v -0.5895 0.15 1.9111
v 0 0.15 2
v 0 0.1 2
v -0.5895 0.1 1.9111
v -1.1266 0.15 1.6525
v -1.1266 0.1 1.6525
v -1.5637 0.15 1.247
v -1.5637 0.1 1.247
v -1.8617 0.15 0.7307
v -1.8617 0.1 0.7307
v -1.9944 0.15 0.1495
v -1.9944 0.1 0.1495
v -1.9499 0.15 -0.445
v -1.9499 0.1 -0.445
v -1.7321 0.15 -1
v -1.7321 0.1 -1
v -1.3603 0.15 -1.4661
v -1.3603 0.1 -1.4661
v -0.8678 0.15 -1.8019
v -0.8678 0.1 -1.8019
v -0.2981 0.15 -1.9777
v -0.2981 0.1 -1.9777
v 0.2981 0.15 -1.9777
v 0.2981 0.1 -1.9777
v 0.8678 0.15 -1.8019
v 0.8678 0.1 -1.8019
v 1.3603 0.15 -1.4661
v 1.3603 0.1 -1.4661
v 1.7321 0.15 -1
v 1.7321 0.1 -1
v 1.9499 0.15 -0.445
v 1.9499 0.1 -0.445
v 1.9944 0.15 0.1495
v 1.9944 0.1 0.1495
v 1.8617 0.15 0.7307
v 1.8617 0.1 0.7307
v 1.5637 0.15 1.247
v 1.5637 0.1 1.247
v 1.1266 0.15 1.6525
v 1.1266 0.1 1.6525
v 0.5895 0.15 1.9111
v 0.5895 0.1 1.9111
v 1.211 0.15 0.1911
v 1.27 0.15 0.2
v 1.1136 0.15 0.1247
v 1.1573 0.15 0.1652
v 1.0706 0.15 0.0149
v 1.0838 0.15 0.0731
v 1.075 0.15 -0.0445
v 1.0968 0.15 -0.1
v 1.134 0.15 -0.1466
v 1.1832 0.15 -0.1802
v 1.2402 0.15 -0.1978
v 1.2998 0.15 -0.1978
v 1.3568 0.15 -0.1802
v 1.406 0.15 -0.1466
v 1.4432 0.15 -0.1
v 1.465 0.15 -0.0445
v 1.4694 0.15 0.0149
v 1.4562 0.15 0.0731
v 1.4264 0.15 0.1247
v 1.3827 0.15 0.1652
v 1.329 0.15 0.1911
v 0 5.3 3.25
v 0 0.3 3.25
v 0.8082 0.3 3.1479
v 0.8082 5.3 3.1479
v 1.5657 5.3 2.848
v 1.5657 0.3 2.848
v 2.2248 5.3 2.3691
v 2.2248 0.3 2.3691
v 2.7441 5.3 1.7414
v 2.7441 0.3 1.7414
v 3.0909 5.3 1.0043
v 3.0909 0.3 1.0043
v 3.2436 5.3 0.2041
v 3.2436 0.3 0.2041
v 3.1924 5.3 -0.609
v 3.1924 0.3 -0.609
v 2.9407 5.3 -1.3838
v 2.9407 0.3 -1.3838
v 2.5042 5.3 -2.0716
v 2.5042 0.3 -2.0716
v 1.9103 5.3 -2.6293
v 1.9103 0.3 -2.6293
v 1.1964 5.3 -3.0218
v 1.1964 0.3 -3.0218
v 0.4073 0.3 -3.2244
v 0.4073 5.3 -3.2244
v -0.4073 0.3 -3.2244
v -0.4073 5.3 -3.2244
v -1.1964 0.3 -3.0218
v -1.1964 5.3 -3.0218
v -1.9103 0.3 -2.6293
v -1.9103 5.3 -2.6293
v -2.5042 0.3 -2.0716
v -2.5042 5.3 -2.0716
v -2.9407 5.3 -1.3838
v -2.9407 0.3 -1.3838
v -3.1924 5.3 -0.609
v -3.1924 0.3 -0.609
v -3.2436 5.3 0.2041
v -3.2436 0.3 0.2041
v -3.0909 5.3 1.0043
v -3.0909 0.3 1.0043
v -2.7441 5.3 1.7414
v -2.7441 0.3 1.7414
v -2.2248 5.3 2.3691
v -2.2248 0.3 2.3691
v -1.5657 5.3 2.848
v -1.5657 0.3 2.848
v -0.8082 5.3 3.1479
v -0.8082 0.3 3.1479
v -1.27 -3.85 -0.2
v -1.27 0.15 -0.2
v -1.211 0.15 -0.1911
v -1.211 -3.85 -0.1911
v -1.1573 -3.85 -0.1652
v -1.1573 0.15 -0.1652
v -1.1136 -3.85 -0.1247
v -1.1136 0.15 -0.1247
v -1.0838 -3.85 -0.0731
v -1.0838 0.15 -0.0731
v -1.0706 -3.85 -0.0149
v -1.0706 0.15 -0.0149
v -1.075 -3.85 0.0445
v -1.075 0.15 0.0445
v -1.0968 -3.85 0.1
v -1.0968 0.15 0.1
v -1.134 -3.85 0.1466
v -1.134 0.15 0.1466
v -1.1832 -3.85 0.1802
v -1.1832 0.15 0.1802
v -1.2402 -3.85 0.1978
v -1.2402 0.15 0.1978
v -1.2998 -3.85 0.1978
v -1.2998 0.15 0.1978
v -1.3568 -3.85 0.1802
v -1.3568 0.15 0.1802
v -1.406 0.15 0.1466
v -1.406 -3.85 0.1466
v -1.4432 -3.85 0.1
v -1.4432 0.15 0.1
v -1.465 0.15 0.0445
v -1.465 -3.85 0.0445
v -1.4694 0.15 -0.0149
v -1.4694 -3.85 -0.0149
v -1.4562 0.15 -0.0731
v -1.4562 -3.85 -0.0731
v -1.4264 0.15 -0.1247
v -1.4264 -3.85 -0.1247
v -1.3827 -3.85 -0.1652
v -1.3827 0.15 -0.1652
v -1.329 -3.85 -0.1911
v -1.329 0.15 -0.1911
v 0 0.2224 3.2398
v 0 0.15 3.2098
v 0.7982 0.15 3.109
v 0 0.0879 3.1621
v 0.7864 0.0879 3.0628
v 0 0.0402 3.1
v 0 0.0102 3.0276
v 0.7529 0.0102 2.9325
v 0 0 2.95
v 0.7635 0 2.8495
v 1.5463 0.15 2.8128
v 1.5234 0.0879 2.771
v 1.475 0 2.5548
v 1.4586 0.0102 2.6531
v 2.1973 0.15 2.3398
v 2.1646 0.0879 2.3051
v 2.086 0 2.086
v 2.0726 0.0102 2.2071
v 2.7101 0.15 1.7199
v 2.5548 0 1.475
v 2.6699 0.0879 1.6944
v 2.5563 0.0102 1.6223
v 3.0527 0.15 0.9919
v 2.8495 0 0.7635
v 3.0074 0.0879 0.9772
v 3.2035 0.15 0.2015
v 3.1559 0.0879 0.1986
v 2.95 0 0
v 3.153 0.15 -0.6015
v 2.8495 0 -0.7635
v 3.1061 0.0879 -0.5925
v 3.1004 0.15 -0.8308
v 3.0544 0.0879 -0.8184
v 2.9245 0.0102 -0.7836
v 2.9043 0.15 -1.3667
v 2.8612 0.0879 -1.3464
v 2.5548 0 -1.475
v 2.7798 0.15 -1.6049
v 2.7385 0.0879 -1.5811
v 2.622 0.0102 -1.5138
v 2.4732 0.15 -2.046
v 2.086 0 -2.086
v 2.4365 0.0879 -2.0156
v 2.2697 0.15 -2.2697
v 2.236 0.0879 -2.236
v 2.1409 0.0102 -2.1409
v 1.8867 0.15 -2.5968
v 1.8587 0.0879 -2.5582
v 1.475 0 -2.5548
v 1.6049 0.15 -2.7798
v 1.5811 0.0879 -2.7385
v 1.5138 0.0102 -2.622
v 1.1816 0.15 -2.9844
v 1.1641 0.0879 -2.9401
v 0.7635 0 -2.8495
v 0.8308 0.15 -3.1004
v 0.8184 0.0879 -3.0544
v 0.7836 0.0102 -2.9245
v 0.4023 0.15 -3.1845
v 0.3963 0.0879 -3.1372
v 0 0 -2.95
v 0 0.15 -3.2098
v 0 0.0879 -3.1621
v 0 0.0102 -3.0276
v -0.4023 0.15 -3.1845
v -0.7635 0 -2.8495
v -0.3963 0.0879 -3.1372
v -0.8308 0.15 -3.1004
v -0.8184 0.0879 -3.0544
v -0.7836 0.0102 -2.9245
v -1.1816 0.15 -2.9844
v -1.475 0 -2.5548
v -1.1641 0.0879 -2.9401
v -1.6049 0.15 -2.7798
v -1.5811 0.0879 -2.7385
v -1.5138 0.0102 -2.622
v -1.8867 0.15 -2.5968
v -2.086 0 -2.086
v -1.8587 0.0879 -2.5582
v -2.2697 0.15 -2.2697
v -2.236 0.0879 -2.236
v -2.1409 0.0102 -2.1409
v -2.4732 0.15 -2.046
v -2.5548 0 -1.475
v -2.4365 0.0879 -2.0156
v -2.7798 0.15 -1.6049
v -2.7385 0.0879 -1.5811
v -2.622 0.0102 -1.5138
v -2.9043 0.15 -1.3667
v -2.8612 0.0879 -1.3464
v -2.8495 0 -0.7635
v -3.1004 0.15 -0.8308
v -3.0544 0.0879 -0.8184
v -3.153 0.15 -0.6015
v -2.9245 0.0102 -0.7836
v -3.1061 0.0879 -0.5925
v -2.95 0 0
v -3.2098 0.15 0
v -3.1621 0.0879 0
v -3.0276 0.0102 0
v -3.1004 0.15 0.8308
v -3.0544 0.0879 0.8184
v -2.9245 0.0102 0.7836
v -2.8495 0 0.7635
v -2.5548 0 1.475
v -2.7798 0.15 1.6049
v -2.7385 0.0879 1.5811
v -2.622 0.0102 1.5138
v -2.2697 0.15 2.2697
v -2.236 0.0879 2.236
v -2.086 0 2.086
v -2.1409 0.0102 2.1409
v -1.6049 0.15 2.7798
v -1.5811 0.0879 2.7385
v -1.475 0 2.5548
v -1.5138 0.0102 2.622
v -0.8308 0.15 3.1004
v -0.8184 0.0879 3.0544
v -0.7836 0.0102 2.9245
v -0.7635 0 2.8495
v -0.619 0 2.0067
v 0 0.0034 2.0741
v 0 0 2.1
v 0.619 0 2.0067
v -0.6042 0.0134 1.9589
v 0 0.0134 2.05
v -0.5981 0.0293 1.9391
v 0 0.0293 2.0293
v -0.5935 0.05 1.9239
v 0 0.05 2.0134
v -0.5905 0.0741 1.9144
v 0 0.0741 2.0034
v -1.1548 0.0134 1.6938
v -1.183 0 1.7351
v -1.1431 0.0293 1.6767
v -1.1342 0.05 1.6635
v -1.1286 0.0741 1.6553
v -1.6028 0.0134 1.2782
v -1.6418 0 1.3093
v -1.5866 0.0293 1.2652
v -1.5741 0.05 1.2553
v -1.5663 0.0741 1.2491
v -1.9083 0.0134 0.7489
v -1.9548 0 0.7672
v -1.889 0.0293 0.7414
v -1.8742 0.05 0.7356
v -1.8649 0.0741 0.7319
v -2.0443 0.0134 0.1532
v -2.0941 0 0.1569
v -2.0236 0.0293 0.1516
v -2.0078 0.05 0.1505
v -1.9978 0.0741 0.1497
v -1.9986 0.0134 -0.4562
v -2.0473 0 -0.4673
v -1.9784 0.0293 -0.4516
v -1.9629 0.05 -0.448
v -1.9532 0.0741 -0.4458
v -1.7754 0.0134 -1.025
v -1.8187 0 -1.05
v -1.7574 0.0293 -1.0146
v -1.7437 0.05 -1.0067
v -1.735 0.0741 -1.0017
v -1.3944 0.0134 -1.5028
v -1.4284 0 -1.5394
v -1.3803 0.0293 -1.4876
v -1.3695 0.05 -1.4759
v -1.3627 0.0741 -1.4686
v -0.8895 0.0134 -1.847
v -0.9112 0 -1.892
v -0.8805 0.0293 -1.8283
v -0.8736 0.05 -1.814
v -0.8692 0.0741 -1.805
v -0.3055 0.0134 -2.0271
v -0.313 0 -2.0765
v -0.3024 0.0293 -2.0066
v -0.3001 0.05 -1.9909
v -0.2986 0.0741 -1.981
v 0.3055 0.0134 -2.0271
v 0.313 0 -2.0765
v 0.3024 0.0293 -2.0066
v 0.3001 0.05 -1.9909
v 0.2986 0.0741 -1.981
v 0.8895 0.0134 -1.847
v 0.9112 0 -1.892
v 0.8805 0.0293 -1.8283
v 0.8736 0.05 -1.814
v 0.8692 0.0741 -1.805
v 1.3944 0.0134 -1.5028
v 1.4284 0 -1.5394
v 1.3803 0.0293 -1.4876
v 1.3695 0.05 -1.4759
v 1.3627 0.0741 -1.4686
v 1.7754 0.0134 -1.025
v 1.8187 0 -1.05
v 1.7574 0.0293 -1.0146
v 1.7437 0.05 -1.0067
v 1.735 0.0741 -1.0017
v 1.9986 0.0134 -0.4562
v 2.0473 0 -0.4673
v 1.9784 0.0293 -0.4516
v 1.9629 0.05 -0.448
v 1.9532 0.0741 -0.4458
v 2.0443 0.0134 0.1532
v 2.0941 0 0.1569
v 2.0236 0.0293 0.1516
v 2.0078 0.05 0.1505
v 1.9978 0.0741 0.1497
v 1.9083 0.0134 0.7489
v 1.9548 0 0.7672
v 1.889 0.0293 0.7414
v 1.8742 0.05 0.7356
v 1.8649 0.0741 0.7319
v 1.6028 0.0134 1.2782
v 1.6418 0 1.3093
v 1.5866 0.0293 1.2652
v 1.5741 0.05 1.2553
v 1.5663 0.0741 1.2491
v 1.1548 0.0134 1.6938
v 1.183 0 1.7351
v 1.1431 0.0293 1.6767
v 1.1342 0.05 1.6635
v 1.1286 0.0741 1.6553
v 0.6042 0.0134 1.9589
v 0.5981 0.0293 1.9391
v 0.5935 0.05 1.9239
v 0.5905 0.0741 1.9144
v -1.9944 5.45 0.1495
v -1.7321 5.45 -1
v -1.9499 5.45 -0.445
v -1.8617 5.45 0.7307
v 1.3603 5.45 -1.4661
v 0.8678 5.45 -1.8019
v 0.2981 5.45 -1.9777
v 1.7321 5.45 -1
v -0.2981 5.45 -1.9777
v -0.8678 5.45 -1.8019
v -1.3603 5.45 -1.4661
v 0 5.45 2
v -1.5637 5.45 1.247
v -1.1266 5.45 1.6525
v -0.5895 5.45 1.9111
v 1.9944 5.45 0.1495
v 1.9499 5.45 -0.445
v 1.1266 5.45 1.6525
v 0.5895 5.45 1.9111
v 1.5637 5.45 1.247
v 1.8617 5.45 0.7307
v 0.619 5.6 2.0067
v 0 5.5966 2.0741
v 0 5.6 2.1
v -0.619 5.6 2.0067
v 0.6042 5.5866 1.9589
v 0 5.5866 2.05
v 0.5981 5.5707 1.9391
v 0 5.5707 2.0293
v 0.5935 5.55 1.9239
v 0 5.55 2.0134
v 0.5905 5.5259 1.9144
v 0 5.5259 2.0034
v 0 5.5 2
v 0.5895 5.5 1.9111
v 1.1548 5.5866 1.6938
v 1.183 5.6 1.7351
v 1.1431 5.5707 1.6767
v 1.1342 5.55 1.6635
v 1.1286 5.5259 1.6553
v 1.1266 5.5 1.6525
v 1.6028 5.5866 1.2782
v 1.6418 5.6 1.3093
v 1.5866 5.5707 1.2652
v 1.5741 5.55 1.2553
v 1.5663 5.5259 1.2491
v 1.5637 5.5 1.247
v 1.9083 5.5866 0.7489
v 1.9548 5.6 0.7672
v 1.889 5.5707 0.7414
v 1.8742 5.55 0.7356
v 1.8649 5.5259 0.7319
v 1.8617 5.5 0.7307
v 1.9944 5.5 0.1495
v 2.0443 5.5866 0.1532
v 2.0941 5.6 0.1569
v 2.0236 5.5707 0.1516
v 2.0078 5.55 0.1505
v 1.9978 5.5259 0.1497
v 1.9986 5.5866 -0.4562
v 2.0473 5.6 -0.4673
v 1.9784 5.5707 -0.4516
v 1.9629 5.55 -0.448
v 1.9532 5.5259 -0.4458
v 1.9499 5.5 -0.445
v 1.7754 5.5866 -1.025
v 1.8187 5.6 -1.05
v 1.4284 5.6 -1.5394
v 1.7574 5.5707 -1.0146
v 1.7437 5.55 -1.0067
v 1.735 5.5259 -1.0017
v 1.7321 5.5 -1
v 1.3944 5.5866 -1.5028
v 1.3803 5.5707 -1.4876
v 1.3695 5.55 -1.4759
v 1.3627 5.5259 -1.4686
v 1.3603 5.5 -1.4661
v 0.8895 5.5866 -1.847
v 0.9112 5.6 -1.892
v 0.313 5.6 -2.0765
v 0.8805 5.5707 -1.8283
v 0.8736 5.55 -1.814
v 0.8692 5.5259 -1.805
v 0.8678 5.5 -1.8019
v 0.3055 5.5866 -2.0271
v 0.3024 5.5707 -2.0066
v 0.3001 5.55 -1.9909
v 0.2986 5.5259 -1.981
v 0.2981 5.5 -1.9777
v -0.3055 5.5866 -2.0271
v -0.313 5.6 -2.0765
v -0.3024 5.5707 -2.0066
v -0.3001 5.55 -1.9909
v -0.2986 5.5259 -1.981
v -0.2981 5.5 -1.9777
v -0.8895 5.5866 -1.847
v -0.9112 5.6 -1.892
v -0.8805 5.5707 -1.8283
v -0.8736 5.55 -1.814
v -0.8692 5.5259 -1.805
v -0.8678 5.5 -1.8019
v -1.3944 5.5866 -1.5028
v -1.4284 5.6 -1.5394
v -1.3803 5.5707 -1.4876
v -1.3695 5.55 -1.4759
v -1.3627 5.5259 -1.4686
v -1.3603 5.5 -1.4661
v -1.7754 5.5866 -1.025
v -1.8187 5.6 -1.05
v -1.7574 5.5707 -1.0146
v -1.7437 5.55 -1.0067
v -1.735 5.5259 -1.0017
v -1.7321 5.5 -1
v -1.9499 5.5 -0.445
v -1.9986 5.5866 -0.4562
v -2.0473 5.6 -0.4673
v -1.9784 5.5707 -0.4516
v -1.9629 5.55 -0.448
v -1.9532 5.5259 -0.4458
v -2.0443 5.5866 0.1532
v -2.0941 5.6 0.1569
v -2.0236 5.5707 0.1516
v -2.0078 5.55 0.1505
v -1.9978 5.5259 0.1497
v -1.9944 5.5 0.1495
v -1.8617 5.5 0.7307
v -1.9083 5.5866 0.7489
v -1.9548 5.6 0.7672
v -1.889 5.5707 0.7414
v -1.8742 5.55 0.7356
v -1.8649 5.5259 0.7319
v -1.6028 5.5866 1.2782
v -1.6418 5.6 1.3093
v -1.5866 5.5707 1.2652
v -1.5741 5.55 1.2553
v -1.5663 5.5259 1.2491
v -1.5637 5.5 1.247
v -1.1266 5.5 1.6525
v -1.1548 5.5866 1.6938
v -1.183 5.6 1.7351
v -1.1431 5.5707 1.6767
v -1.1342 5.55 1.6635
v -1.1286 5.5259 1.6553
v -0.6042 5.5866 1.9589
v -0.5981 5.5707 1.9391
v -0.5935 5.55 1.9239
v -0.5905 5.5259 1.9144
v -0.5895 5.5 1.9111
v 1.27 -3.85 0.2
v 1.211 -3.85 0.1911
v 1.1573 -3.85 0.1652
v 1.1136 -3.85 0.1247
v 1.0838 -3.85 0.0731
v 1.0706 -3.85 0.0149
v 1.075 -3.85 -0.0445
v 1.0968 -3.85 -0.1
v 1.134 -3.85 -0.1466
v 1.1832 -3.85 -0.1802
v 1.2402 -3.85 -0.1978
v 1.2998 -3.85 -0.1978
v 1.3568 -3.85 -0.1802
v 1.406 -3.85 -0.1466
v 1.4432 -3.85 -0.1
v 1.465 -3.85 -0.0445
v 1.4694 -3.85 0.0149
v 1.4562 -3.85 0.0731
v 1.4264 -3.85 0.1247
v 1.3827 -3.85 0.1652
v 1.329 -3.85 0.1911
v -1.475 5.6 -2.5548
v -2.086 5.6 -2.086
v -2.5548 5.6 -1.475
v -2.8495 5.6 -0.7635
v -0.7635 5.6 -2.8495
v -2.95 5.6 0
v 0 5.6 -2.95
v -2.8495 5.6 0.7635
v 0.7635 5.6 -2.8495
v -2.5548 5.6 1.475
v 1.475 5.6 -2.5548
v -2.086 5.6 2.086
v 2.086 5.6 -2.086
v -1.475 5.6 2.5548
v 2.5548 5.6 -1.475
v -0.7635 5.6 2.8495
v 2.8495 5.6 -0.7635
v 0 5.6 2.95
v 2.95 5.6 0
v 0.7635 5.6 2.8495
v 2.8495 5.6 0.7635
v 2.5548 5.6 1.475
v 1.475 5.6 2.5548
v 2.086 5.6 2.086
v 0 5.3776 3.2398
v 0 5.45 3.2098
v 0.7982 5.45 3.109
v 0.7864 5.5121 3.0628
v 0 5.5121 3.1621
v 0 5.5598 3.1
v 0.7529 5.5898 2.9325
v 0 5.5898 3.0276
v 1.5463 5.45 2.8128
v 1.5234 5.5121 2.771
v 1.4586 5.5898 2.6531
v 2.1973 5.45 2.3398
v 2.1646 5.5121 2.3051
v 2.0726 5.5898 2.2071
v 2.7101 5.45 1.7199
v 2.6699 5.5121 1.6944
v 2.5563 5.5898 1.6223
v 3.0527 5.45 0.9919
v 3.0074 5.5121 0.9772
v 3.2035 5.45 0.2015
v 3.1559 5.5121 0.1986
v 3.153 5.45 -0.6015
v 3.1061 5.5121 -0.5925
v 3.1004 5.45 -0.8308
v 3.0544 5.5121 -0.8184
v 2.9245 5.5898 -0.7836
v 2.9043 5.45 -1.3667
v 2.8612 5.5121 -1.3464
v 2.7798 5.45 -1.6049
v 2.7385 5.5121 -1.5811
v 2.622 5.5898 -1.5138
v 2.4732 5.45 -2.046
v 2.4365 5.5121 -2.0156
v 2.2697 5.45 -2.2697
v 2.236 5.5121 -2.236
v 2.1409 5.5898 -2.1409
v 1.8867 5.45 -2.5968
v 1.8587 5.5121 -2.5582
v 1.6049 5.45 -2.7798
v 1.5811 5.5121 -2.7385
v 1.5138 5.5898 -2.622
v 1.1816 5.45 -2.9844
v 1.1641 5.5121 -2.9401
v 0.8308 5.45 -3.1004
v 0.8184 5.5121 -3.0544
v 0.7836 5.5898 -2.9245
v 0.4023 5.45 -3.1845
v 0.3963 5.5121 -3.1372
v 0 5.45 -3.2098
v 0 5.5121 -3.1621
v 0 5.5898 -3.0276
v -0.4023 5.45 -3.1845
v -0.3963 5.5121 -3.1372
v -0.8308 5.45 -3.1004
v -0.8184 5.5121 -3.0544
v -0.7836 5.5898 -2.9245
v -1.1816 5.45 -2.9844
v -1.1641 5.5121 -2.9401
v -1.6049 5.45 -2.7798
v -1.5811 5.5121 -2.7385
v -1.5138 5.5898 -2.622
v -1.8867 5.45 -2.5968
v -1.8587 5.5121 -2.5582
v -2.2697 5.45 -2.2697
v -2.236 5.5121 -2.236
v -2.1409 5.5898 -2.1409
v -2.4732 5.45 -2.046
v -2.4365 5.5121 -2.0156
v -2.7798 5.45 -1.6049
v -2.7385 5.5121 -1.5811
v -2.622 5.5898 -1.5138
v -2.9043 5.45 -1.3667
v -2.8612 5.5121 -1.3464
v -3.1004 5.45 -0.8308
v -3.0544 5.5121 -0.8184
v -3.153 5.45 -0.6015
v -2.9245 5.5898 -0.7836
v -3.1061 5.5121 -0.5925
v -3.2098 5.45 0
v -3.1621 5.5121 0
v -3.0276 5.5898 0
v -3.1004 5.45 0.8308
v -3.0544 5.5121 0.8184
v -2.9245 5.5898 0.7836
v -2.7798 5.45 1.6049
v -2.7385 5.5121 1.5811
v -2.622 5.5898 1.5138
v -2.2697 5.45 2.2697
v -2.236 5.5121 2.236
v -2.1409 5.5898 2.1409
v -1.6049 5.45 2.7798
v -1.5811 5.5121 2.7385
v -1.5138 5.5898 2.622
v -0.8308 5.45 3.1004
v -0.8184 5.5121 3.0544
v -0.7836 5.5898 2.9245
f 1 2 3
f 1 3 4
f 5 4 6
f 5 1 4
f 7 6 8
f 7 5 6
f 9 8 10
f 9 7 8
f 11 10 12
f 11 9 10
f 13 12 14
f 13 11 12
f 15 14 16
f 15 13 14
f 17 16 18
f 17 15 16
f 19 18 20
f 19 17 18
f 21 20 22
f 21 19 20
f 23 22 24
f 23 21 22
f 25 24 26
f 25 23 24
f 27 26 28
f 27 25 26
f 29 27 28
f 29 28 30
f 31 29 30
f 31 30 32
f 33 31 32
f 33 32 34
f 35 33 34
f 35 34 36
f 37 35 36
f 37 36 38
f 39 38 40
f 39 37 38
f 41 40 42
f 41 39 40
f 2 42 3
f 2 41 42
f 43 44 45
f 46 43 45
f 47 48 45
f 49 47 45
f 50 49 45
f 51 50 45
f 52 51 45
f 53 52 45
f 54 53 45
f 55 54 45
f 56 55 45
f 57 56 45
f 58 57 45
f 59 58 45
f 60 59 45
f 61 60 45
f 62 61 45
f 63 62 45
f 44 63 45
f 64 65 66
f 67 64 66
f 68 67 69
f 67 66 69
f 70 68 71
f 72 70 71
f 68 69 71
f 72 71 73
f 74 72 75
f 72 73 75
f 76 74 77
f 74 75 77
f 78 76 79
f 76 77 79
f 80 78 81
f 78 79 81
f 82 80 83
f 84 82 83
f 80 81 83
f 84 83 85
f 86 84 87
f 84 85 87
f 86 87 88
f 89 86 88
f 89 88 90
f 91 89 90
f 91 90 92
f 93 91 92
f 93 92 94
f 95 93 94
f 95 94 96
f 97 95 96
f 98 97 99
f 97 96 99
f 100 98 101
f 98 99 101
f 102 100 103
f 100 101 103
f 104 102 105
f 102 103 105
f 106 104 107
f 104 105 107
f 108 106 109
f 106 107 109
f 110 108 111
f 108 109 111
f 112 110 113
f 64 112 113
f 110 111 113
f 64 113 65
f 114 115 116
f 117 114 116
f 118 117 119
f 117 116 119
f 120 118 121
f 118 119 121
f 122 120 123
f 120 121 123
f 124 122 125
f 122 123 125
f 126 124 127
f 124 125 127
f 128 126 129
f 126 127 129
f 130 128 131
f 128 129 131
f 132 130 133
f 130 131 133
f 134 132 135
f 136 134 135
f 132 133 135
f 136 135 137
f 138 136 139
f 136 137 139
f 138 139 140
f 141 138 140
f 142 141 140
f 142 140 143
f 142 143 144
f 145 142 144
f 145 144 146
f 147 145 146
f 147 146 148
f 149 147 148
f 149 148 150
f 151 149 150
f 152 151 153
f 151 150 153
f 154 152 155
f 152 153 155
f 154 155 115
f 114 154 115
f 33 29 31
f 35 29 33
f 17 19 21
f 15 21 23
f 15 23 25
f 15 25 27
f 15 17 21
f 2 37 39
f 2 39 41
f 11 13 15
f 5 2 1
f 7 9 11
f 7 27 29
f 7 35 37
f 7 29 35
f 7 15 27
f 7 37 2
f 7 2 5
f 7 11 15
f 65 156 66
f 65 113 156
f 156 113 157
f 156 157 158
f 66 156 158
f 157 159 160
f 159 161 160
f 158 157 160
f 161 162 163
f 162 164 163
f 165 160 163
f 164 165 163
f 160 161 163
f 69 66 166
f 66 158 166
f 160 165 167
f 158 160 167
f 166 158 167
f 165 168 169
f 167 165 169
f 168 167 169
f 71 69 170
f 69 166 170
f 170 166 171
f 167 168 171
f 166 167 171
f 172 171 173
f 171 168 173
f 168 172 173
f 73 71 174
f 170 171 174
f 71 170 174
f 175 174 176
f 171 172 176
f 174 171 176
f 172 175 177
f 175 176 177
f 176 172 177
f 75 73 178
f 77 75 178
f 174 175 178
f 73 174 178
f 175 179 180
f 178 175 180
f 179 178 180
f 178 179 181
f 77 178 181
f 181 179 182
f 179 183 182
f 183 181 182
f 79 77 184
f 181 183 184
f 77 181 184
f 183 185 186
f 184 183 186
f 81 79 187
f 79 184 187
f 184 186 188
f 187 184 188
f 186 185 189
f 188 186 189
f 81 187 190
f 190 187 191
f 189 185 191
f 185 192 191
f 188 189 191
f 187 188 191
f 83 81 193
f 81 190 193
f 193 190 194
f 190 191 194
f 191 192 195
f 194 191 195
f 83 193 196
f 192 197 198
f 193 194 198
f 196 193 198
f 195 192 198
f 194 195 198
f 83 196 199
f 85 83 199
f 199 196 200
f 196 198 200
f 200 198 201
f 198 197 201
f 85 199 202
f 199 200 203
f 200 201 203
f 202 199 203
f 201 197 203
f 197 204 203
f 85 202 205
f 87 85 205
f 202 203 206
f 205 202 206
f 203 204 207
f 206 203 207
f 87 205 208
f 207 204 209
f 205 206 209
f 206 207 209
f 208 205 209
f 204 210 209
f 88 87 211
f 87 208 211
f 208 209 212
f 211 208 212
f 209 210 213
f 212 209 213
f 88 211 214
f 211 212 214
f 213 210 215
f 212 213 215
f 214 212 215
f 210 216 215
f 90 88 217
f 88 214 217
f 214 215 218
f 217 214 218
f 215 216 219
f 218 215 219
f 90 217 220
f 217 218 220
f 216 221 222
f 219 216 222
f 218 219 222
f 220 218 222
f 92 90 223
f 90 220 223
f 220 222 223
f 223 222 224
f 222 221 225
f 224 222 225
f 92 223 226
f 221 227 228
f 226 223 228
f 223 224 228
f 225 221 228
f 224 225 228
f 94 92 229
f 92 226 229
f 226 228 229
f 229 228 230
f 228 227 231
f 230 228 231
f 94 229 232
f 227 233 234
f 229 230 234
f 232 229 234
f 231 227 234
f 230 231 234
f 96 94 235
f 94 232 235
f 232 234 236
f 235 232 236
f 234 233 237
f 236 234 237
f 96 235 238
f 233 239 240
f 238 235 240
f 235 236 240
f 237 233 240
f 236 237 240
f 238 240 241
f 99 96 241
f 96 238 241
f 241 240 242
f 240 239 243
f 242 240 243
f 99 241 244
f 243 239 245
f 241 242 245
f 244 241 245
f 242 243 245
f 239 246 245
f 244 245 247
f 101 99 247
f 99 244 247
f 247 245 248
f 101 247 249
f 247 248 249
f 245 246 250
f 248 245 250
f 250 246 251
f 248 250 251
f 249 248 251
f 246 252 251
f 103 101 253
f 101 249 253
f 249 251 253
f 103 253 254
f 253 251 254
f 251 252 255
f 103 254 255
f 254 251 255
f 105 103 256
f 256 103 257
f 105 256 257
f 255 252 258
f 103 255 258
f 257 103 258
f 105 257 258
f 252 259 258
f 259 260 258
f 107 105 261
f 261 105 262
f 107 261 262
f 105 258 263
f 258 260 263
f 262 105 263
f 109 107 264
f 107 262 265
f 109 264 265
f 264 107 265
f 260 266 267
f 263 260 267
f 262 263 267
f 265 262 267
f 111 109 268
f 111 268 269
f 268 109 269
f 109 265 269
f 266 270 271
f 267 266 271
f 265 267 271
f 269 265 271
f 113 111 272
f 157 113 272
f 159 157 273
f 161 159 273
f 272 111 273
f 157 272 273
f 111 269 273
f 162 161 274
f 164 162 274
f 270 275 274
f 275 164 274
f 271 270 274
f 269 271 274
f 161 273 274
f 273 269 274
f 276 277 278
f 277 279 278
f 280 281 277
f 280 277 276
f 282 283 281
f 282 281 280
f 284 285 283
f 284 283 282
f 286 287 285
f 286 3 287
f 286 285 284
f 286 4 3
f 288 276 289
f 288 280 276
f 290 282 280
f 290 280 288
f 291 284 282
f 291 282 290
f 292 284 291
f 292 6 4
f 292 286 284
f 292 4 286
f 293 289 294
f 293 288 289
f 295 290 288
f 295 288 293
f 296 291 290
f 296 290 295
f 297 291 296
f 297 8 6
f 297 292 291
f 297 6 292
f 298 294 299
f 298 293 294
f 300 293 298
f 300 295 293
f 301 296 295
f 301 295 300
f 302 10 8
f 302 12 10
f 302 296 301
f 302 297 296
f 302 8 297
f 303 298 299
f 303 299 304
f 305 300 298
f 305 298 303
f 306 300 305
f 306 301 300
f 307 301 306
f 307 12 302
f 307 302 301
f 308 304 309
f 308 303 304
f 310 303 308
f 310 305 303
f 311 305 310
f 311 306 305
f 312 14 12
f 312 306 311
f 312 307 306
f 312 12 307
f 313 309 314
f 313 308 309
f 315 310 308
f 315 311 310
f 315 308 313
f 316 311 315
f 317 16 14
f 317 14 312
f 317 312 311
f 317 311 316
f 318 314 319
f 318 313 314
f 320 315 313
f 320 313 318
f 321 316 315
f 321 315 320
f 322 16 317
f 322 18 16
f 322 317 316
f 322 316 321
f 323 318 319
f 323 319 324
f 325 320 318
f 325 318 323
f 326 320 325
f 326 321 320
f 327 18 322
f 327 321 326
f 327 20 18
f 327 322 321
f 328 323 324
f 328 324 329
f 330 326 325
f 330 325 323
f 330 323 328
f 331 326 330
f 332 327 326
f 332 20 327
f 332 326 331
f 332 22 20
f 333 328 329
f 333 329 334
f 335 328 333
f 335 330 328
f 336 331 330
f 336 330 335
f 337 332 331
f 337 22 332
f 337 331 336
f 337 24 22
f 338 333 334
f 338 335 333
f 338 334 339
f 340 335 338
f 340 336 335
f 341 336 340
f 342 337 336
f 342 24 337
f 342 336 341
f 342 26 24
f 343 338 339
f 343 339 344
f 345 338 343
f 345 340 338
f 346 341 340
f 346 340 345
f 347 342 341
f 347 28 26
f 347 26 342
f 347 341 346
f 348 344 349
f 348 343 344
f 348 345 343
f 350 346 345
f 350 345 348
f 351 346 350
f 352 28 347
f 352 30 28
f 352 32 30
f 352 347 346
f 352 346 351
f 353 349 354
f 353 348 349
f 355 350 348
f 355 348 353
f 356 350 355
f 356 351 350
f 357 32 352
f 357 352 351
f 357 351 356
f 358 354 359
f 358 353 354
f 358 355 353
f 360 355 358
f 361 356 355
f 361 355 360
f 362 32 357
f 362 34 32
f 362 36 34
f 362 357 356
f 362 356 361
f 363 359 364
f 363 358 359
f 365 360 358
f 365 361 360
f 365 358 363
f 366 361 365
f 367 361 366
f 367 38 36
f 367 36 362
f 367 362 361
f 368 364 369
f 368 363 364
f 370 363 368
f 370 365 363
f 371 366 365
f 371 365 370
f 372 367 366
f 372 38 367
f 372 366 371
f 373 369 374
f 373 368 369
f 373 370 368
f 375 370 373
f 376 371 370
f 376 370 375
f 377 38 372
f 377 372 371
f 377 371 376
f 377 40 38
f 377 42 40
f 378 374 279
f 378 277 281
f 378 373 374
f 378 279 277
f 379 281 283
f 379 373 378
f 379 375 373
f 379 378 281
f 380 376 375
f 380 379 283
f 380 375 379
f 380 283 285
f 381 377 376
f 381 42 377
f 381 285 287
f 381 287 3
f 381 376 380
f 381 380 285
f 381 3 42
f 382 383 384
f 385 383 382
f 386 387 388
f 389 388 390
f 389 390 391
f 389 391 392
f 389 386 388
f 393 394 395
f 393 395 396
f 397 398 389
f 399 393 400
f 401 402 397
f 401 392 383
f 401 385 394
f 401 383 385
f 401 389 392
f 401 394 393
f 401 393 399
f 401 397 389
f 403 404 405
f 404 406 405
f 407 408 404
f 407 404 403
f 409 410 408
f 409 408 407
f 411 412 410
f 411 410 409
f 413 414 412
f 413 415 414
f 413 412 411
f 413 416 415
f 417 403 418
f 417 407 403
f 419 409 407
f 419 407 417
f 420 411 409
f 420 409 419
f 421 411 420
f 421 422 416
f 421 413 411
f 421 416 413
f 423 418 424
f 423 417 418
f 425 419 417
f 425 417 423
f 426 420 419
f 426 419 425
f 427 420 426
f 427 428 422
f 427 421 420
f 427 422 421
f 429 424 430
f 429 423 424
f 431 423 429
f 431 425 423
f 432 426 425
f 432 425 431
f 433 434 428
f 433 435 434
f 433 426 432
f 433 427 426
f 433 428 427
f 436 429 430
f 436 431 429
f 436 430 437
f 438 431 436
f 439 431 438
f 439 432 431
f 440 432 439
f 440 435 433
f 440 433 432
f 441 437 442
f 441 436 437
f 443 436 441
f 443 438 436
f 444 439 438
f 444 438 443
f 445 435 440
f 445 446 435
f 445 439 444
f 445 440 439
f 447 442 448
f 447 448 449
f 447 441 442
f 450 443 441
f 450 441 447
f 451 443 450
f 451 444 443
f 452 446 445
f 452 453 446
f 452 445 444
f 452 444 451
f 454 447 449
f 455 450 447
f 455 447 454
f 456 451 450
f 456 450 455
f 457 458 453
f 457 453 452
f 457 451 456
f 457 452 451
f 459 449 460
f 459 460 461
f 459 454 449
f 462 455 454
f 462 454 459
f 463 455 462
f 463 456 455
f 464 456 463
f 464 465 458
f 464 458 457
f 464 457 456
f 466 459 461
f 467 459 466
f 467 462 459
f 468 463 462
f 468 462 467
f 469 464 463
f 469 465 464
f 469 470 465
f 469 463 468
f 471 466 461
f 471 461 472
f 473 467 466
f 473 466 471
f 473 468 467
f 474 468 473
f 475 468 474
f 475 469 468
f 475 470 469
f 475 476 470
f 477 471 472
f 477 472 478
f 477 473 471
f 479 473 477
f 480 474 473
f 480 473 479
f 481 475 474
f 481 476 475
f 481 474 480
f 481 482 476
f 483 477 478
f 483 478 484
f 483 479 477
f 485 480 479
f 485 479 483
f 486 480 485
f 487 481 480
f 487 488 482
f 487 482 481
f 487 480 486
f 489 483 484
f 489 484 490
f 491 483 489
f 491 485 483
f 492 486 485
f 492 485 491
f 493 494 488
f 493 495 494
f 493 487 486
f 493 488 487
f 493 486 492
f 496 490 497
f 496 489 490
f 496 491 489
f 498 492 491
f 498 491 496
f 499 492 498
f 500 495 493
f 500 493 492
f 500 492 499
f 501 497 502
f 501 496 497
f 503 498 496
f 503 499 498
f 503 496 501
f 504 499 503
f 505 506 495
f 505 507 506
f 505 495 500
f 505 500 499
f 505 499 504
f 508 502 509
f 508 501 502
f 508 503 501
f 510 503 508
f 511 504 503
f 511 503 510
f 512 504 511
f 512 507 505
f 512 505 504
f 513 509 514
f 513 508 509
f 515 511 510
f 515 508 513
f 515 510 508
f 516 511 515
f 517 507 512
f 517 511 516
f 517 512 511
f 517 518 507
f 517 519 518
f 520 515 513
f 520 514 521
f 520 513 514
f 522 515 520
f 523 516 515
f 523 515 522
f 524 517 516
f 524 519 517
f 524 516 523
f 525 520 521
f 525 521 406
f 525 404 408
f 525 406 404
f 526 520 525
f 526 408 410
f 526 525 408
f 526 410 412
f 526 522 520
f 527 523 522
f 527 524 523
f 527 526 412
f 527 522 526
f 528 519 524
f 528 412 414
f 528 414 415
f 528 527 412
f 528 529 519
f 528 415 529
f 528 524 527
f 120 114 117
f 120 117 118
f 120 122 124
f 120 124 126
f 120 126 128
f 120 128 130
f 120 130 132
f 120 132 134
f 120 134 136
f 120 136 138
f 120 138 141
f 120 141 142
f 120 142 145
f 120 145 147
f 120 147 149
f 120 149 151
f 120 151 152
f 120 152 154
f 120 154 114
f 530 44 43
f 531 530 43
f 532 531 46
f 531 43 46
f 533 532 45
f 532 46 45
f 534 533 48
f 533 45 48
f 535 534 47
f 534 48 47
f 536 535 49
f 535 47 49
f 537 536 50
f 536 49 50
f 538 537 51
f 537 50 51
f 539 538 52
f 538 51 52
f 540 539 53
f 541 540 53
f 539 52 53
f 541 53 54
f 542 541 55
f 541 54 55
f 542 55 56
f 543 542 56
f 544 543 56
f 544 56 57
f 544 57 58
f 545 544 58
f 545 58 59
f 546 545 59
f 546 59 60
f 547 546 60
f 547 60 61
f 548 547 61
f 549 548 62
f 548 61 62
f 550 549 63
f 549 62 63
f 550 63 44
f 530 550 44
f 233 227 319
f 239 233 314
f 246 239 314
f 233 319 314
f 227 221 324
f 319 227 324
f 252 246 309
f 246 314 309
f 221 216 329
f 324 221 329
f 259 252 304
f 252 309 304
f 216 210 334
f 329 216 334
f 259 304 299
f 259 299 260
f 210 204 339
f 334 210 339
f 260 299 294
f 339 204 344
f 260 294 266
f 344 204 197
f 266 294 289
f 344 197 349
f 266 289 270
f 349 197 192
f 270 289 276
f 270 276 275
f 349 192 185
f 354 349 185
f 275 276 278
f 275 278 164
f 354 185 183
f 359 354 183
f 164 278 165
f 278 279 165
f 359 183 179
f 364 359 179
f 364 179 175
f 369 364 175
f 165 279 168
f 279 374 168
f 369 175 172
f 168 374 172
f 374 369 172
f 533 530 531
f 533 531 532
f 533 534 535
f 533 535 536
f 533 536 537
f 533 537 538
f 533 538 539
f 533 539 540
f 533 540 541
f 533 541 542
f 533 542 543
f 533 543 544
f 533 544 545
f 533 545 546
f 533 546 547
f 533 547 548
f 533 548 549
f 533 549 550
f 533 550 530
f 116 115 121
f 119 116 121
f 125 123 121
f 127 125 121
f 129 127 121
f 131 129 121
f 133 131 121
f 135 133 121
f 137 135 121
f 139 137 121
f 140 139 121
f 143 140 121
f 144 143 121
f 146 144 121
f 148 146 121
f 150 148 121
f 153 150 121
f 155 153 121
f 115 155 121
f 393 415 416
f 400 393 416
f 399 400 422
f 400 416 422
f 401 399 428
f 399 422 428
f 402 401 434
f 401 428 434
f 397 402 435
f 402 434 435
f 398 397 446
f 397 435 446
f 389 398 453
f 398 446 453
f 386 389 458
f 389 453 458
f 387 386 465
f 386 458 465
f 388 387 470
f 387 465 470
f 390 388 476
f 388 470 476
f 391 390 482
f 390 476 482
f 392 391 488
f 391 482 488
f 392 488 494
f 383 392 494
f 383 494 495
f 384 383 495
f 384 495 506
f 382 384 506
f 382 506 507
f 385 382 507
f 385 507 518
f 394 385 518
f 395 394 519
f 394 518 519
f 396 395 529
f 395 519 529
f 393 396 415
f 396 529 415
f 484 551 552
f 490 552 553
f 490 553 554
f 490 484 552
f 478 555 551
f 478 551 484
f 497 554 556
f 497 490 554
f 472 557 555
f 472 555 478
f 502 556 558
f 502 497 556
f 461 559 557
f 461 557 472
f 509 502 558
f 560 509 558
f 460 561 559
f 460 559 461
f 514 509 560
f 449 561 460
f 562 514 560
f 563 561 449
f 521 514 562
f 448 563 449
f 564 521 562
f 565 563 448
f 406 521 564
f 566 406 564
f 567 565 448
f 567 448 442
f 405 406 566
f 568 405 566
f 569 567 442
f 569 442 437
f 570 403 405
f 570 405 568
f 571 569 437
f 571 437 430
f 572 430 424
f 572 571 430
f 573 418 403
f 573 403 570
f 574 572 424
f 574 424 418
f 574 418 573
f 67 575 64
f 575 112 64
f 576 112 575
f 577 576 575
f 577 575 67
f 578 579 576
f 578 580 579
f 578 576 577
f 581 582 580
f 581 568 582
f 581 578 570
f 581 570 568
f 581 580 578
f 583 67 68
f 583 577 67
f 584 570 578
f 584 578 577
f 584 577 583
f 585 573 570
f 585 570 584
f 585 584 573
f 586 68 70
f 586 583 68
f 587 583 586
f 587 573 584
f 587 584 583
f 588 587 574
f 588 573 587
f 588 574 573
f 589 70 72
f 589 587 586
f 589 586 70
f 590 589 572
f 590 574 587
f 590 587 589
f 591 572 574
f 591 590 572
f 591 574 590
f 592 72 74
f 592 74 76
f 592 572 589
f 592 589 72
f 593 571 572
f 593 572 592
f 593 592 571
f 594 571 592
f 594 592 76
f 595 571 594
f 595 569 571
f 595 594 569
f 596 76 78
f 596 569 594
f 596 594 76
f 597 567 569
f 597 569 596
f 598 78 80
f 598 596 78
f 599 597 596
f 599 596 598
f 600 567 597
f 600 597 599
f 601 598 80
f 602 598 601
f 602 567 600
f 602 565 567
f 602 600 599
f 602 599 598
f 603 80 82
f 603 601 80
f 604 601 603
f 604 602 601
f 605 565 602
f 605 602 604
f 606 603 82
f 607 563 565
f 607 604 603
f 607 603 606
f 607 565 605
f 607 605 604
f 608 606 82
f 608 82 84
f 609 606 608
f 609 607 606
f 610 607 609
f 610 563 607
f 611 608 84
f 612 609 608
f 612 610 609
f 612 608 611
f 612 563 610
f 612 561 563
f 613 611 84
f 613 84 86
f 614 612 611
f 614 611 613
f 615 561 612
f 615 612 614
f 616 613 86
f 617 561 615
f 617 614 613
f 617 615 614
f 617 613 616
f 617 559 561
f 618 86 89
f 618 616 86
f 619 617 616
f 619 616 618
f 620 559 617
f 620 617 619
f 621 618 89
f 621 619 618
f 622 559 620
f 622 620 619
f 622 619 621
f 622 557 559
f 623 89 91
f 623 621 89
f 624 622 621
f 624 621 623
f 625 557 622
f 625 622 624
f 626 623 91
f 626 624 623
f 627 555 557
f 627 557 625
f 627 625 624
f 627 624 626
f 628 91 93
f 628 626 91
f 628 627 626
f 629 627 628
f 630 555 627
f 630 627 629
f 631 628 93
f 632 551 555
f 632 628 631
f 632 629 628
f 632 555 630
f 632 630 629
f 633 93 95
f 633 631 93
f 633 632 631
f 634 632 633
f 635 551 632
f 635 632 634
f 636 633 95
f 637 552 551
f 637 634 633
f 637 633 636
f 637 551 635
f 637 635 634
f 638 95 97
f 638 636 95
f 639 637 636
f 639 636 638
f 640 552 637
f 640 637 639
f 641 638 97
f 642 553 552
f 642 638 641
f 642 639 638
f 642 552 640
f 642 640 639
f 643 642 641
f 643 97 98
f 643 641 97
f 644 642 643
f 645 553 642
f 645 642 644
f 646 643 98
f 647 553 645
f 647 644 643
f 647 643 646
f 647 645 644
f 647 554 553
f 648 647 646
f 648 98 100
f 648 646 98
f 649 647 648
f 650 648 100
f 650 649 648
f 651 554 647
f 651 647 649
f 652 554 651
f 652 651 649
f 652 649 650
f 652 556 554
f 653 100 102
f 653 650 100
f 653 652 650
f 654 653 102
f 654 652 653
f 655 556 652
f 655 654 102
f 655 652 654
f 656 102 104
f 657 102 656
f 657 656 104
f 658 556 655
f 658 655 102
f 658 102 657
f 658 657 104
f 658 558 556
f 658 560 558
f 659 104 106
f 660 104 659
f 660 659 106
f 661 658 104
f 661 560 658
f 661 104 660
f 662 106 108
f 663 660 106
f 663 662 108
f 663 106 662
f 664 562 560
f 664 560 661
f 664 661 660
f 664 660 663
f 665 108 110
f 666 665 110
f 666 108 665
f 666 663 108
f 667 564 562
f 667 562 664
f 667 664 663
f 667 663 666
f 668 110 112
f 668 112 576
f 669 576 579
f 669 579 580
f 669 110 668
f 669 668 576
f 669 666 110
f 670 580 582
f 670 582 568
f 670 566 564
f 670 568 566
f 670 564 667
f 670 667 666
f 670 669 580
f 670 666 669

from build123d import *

# Parameters (mm, degrees)
SKETCH_1_R          = 3.25
EXTRUDE_1_DEPTH     = 5.6
SKETCH_2_R          = 2
CUT_EXTRUDE_1_DEPTH = 0.15
CUT_EXTRUDE_START   = -0.15
SKETCH_3_R          = 2
CUT_EXTRUDE_2_DEPTH = 0.15
SKETCH_4_R          = 0.2
EXTRUDE_2_DEPTH     = 4
EXTRUDE_2_2_DEPTH   = 4
FILLET_1_R          = 0.3
FILLET_2_R          = 0.1


with BuildPart() as part:
    # Эскиз1 → Бобышка-Вытянуть1 (new body)
    with BuildSketch(Plane(origin=(0, 0, 0), x_dir=(1, 0, 0), z_dir=(0, 1, 0))):
        with Locations(Location((0, 0, 0), (0, 0, 270))):
            Circle(SKETCH_1_R)
    extrude(amount=EXTRUDE_1_DEPTH)

    # Эскиз2 → Вырез-Вытянуть1 (cut)
    with BuildSketch(Plane(origin=(0, 5.6, 0), x_dir=(1, 0, 0), z_dir=(0, 1, 0))):
        with Locations(Location((0, 0, 0), (0, 0, 270))):
            Circle(SKETCH_2_R)
    extrude(amount=-CUT_EXTRUDE_1_DEPTH, mode=Mode.SUBTRACT)

    # Эскиз3 → Вырез-Вытянуть2 (cut)
    with BuildSketch(Plane.XZ.offset(CUT_EXTRUDE_START)):
        with Locations(Location((0, 0, 0), (0, 0, 90))):
            Circle(SKETCH_3_R)
    extrude(amount=CUT_EXTRUDE_2_DEPTH, mode=Mode.SUBTRACT)

    # Скругление1
    fillet_1_edges = [part.edges().sort_by_distance(p)[0] for p in [
        (0, 0, -3.25),
        (0, 5.6, -3.25),
    ]]
    fillet(fillet_1_edges, radius=FILLET_1_R)

    # Скругление2
    fillet_2_edges = [part.edges().sort_by_distance(p)[0] for p in [
        (0, 0, -2),
        (0, 5.6, -2),
    ]]
    fillet(fillet_2_edges, radius=FILLET_2_R)


with BuildPart() as body_2:
    # Эскиз4 → Бобышка-Вытянуть2 (new body)
    with BuildSketch(Plane.XZ.offset(-0.15)):
        with Locations(Location((-1.27, 0, 0), (0, 0, 270))):
            Circle(SKETCH_4_R)
    extrude(amount=EXTRUDE_2_DEPTH)


with BuildPart() as body_3:
    # Эскиз4 → Extrude 2 2 (new body)
    with BuildSketch(Plane.XZ.offset(-0.15)):
        with Locations(Location((1.27, 0, 0), (0, 0, 90))):
            Circle(SKETCH_4_R)
    extrude(amount=EXTRUDE_2_2_DEPTH)


solid = Compound([part.part, body_2.part, body_3.part])
